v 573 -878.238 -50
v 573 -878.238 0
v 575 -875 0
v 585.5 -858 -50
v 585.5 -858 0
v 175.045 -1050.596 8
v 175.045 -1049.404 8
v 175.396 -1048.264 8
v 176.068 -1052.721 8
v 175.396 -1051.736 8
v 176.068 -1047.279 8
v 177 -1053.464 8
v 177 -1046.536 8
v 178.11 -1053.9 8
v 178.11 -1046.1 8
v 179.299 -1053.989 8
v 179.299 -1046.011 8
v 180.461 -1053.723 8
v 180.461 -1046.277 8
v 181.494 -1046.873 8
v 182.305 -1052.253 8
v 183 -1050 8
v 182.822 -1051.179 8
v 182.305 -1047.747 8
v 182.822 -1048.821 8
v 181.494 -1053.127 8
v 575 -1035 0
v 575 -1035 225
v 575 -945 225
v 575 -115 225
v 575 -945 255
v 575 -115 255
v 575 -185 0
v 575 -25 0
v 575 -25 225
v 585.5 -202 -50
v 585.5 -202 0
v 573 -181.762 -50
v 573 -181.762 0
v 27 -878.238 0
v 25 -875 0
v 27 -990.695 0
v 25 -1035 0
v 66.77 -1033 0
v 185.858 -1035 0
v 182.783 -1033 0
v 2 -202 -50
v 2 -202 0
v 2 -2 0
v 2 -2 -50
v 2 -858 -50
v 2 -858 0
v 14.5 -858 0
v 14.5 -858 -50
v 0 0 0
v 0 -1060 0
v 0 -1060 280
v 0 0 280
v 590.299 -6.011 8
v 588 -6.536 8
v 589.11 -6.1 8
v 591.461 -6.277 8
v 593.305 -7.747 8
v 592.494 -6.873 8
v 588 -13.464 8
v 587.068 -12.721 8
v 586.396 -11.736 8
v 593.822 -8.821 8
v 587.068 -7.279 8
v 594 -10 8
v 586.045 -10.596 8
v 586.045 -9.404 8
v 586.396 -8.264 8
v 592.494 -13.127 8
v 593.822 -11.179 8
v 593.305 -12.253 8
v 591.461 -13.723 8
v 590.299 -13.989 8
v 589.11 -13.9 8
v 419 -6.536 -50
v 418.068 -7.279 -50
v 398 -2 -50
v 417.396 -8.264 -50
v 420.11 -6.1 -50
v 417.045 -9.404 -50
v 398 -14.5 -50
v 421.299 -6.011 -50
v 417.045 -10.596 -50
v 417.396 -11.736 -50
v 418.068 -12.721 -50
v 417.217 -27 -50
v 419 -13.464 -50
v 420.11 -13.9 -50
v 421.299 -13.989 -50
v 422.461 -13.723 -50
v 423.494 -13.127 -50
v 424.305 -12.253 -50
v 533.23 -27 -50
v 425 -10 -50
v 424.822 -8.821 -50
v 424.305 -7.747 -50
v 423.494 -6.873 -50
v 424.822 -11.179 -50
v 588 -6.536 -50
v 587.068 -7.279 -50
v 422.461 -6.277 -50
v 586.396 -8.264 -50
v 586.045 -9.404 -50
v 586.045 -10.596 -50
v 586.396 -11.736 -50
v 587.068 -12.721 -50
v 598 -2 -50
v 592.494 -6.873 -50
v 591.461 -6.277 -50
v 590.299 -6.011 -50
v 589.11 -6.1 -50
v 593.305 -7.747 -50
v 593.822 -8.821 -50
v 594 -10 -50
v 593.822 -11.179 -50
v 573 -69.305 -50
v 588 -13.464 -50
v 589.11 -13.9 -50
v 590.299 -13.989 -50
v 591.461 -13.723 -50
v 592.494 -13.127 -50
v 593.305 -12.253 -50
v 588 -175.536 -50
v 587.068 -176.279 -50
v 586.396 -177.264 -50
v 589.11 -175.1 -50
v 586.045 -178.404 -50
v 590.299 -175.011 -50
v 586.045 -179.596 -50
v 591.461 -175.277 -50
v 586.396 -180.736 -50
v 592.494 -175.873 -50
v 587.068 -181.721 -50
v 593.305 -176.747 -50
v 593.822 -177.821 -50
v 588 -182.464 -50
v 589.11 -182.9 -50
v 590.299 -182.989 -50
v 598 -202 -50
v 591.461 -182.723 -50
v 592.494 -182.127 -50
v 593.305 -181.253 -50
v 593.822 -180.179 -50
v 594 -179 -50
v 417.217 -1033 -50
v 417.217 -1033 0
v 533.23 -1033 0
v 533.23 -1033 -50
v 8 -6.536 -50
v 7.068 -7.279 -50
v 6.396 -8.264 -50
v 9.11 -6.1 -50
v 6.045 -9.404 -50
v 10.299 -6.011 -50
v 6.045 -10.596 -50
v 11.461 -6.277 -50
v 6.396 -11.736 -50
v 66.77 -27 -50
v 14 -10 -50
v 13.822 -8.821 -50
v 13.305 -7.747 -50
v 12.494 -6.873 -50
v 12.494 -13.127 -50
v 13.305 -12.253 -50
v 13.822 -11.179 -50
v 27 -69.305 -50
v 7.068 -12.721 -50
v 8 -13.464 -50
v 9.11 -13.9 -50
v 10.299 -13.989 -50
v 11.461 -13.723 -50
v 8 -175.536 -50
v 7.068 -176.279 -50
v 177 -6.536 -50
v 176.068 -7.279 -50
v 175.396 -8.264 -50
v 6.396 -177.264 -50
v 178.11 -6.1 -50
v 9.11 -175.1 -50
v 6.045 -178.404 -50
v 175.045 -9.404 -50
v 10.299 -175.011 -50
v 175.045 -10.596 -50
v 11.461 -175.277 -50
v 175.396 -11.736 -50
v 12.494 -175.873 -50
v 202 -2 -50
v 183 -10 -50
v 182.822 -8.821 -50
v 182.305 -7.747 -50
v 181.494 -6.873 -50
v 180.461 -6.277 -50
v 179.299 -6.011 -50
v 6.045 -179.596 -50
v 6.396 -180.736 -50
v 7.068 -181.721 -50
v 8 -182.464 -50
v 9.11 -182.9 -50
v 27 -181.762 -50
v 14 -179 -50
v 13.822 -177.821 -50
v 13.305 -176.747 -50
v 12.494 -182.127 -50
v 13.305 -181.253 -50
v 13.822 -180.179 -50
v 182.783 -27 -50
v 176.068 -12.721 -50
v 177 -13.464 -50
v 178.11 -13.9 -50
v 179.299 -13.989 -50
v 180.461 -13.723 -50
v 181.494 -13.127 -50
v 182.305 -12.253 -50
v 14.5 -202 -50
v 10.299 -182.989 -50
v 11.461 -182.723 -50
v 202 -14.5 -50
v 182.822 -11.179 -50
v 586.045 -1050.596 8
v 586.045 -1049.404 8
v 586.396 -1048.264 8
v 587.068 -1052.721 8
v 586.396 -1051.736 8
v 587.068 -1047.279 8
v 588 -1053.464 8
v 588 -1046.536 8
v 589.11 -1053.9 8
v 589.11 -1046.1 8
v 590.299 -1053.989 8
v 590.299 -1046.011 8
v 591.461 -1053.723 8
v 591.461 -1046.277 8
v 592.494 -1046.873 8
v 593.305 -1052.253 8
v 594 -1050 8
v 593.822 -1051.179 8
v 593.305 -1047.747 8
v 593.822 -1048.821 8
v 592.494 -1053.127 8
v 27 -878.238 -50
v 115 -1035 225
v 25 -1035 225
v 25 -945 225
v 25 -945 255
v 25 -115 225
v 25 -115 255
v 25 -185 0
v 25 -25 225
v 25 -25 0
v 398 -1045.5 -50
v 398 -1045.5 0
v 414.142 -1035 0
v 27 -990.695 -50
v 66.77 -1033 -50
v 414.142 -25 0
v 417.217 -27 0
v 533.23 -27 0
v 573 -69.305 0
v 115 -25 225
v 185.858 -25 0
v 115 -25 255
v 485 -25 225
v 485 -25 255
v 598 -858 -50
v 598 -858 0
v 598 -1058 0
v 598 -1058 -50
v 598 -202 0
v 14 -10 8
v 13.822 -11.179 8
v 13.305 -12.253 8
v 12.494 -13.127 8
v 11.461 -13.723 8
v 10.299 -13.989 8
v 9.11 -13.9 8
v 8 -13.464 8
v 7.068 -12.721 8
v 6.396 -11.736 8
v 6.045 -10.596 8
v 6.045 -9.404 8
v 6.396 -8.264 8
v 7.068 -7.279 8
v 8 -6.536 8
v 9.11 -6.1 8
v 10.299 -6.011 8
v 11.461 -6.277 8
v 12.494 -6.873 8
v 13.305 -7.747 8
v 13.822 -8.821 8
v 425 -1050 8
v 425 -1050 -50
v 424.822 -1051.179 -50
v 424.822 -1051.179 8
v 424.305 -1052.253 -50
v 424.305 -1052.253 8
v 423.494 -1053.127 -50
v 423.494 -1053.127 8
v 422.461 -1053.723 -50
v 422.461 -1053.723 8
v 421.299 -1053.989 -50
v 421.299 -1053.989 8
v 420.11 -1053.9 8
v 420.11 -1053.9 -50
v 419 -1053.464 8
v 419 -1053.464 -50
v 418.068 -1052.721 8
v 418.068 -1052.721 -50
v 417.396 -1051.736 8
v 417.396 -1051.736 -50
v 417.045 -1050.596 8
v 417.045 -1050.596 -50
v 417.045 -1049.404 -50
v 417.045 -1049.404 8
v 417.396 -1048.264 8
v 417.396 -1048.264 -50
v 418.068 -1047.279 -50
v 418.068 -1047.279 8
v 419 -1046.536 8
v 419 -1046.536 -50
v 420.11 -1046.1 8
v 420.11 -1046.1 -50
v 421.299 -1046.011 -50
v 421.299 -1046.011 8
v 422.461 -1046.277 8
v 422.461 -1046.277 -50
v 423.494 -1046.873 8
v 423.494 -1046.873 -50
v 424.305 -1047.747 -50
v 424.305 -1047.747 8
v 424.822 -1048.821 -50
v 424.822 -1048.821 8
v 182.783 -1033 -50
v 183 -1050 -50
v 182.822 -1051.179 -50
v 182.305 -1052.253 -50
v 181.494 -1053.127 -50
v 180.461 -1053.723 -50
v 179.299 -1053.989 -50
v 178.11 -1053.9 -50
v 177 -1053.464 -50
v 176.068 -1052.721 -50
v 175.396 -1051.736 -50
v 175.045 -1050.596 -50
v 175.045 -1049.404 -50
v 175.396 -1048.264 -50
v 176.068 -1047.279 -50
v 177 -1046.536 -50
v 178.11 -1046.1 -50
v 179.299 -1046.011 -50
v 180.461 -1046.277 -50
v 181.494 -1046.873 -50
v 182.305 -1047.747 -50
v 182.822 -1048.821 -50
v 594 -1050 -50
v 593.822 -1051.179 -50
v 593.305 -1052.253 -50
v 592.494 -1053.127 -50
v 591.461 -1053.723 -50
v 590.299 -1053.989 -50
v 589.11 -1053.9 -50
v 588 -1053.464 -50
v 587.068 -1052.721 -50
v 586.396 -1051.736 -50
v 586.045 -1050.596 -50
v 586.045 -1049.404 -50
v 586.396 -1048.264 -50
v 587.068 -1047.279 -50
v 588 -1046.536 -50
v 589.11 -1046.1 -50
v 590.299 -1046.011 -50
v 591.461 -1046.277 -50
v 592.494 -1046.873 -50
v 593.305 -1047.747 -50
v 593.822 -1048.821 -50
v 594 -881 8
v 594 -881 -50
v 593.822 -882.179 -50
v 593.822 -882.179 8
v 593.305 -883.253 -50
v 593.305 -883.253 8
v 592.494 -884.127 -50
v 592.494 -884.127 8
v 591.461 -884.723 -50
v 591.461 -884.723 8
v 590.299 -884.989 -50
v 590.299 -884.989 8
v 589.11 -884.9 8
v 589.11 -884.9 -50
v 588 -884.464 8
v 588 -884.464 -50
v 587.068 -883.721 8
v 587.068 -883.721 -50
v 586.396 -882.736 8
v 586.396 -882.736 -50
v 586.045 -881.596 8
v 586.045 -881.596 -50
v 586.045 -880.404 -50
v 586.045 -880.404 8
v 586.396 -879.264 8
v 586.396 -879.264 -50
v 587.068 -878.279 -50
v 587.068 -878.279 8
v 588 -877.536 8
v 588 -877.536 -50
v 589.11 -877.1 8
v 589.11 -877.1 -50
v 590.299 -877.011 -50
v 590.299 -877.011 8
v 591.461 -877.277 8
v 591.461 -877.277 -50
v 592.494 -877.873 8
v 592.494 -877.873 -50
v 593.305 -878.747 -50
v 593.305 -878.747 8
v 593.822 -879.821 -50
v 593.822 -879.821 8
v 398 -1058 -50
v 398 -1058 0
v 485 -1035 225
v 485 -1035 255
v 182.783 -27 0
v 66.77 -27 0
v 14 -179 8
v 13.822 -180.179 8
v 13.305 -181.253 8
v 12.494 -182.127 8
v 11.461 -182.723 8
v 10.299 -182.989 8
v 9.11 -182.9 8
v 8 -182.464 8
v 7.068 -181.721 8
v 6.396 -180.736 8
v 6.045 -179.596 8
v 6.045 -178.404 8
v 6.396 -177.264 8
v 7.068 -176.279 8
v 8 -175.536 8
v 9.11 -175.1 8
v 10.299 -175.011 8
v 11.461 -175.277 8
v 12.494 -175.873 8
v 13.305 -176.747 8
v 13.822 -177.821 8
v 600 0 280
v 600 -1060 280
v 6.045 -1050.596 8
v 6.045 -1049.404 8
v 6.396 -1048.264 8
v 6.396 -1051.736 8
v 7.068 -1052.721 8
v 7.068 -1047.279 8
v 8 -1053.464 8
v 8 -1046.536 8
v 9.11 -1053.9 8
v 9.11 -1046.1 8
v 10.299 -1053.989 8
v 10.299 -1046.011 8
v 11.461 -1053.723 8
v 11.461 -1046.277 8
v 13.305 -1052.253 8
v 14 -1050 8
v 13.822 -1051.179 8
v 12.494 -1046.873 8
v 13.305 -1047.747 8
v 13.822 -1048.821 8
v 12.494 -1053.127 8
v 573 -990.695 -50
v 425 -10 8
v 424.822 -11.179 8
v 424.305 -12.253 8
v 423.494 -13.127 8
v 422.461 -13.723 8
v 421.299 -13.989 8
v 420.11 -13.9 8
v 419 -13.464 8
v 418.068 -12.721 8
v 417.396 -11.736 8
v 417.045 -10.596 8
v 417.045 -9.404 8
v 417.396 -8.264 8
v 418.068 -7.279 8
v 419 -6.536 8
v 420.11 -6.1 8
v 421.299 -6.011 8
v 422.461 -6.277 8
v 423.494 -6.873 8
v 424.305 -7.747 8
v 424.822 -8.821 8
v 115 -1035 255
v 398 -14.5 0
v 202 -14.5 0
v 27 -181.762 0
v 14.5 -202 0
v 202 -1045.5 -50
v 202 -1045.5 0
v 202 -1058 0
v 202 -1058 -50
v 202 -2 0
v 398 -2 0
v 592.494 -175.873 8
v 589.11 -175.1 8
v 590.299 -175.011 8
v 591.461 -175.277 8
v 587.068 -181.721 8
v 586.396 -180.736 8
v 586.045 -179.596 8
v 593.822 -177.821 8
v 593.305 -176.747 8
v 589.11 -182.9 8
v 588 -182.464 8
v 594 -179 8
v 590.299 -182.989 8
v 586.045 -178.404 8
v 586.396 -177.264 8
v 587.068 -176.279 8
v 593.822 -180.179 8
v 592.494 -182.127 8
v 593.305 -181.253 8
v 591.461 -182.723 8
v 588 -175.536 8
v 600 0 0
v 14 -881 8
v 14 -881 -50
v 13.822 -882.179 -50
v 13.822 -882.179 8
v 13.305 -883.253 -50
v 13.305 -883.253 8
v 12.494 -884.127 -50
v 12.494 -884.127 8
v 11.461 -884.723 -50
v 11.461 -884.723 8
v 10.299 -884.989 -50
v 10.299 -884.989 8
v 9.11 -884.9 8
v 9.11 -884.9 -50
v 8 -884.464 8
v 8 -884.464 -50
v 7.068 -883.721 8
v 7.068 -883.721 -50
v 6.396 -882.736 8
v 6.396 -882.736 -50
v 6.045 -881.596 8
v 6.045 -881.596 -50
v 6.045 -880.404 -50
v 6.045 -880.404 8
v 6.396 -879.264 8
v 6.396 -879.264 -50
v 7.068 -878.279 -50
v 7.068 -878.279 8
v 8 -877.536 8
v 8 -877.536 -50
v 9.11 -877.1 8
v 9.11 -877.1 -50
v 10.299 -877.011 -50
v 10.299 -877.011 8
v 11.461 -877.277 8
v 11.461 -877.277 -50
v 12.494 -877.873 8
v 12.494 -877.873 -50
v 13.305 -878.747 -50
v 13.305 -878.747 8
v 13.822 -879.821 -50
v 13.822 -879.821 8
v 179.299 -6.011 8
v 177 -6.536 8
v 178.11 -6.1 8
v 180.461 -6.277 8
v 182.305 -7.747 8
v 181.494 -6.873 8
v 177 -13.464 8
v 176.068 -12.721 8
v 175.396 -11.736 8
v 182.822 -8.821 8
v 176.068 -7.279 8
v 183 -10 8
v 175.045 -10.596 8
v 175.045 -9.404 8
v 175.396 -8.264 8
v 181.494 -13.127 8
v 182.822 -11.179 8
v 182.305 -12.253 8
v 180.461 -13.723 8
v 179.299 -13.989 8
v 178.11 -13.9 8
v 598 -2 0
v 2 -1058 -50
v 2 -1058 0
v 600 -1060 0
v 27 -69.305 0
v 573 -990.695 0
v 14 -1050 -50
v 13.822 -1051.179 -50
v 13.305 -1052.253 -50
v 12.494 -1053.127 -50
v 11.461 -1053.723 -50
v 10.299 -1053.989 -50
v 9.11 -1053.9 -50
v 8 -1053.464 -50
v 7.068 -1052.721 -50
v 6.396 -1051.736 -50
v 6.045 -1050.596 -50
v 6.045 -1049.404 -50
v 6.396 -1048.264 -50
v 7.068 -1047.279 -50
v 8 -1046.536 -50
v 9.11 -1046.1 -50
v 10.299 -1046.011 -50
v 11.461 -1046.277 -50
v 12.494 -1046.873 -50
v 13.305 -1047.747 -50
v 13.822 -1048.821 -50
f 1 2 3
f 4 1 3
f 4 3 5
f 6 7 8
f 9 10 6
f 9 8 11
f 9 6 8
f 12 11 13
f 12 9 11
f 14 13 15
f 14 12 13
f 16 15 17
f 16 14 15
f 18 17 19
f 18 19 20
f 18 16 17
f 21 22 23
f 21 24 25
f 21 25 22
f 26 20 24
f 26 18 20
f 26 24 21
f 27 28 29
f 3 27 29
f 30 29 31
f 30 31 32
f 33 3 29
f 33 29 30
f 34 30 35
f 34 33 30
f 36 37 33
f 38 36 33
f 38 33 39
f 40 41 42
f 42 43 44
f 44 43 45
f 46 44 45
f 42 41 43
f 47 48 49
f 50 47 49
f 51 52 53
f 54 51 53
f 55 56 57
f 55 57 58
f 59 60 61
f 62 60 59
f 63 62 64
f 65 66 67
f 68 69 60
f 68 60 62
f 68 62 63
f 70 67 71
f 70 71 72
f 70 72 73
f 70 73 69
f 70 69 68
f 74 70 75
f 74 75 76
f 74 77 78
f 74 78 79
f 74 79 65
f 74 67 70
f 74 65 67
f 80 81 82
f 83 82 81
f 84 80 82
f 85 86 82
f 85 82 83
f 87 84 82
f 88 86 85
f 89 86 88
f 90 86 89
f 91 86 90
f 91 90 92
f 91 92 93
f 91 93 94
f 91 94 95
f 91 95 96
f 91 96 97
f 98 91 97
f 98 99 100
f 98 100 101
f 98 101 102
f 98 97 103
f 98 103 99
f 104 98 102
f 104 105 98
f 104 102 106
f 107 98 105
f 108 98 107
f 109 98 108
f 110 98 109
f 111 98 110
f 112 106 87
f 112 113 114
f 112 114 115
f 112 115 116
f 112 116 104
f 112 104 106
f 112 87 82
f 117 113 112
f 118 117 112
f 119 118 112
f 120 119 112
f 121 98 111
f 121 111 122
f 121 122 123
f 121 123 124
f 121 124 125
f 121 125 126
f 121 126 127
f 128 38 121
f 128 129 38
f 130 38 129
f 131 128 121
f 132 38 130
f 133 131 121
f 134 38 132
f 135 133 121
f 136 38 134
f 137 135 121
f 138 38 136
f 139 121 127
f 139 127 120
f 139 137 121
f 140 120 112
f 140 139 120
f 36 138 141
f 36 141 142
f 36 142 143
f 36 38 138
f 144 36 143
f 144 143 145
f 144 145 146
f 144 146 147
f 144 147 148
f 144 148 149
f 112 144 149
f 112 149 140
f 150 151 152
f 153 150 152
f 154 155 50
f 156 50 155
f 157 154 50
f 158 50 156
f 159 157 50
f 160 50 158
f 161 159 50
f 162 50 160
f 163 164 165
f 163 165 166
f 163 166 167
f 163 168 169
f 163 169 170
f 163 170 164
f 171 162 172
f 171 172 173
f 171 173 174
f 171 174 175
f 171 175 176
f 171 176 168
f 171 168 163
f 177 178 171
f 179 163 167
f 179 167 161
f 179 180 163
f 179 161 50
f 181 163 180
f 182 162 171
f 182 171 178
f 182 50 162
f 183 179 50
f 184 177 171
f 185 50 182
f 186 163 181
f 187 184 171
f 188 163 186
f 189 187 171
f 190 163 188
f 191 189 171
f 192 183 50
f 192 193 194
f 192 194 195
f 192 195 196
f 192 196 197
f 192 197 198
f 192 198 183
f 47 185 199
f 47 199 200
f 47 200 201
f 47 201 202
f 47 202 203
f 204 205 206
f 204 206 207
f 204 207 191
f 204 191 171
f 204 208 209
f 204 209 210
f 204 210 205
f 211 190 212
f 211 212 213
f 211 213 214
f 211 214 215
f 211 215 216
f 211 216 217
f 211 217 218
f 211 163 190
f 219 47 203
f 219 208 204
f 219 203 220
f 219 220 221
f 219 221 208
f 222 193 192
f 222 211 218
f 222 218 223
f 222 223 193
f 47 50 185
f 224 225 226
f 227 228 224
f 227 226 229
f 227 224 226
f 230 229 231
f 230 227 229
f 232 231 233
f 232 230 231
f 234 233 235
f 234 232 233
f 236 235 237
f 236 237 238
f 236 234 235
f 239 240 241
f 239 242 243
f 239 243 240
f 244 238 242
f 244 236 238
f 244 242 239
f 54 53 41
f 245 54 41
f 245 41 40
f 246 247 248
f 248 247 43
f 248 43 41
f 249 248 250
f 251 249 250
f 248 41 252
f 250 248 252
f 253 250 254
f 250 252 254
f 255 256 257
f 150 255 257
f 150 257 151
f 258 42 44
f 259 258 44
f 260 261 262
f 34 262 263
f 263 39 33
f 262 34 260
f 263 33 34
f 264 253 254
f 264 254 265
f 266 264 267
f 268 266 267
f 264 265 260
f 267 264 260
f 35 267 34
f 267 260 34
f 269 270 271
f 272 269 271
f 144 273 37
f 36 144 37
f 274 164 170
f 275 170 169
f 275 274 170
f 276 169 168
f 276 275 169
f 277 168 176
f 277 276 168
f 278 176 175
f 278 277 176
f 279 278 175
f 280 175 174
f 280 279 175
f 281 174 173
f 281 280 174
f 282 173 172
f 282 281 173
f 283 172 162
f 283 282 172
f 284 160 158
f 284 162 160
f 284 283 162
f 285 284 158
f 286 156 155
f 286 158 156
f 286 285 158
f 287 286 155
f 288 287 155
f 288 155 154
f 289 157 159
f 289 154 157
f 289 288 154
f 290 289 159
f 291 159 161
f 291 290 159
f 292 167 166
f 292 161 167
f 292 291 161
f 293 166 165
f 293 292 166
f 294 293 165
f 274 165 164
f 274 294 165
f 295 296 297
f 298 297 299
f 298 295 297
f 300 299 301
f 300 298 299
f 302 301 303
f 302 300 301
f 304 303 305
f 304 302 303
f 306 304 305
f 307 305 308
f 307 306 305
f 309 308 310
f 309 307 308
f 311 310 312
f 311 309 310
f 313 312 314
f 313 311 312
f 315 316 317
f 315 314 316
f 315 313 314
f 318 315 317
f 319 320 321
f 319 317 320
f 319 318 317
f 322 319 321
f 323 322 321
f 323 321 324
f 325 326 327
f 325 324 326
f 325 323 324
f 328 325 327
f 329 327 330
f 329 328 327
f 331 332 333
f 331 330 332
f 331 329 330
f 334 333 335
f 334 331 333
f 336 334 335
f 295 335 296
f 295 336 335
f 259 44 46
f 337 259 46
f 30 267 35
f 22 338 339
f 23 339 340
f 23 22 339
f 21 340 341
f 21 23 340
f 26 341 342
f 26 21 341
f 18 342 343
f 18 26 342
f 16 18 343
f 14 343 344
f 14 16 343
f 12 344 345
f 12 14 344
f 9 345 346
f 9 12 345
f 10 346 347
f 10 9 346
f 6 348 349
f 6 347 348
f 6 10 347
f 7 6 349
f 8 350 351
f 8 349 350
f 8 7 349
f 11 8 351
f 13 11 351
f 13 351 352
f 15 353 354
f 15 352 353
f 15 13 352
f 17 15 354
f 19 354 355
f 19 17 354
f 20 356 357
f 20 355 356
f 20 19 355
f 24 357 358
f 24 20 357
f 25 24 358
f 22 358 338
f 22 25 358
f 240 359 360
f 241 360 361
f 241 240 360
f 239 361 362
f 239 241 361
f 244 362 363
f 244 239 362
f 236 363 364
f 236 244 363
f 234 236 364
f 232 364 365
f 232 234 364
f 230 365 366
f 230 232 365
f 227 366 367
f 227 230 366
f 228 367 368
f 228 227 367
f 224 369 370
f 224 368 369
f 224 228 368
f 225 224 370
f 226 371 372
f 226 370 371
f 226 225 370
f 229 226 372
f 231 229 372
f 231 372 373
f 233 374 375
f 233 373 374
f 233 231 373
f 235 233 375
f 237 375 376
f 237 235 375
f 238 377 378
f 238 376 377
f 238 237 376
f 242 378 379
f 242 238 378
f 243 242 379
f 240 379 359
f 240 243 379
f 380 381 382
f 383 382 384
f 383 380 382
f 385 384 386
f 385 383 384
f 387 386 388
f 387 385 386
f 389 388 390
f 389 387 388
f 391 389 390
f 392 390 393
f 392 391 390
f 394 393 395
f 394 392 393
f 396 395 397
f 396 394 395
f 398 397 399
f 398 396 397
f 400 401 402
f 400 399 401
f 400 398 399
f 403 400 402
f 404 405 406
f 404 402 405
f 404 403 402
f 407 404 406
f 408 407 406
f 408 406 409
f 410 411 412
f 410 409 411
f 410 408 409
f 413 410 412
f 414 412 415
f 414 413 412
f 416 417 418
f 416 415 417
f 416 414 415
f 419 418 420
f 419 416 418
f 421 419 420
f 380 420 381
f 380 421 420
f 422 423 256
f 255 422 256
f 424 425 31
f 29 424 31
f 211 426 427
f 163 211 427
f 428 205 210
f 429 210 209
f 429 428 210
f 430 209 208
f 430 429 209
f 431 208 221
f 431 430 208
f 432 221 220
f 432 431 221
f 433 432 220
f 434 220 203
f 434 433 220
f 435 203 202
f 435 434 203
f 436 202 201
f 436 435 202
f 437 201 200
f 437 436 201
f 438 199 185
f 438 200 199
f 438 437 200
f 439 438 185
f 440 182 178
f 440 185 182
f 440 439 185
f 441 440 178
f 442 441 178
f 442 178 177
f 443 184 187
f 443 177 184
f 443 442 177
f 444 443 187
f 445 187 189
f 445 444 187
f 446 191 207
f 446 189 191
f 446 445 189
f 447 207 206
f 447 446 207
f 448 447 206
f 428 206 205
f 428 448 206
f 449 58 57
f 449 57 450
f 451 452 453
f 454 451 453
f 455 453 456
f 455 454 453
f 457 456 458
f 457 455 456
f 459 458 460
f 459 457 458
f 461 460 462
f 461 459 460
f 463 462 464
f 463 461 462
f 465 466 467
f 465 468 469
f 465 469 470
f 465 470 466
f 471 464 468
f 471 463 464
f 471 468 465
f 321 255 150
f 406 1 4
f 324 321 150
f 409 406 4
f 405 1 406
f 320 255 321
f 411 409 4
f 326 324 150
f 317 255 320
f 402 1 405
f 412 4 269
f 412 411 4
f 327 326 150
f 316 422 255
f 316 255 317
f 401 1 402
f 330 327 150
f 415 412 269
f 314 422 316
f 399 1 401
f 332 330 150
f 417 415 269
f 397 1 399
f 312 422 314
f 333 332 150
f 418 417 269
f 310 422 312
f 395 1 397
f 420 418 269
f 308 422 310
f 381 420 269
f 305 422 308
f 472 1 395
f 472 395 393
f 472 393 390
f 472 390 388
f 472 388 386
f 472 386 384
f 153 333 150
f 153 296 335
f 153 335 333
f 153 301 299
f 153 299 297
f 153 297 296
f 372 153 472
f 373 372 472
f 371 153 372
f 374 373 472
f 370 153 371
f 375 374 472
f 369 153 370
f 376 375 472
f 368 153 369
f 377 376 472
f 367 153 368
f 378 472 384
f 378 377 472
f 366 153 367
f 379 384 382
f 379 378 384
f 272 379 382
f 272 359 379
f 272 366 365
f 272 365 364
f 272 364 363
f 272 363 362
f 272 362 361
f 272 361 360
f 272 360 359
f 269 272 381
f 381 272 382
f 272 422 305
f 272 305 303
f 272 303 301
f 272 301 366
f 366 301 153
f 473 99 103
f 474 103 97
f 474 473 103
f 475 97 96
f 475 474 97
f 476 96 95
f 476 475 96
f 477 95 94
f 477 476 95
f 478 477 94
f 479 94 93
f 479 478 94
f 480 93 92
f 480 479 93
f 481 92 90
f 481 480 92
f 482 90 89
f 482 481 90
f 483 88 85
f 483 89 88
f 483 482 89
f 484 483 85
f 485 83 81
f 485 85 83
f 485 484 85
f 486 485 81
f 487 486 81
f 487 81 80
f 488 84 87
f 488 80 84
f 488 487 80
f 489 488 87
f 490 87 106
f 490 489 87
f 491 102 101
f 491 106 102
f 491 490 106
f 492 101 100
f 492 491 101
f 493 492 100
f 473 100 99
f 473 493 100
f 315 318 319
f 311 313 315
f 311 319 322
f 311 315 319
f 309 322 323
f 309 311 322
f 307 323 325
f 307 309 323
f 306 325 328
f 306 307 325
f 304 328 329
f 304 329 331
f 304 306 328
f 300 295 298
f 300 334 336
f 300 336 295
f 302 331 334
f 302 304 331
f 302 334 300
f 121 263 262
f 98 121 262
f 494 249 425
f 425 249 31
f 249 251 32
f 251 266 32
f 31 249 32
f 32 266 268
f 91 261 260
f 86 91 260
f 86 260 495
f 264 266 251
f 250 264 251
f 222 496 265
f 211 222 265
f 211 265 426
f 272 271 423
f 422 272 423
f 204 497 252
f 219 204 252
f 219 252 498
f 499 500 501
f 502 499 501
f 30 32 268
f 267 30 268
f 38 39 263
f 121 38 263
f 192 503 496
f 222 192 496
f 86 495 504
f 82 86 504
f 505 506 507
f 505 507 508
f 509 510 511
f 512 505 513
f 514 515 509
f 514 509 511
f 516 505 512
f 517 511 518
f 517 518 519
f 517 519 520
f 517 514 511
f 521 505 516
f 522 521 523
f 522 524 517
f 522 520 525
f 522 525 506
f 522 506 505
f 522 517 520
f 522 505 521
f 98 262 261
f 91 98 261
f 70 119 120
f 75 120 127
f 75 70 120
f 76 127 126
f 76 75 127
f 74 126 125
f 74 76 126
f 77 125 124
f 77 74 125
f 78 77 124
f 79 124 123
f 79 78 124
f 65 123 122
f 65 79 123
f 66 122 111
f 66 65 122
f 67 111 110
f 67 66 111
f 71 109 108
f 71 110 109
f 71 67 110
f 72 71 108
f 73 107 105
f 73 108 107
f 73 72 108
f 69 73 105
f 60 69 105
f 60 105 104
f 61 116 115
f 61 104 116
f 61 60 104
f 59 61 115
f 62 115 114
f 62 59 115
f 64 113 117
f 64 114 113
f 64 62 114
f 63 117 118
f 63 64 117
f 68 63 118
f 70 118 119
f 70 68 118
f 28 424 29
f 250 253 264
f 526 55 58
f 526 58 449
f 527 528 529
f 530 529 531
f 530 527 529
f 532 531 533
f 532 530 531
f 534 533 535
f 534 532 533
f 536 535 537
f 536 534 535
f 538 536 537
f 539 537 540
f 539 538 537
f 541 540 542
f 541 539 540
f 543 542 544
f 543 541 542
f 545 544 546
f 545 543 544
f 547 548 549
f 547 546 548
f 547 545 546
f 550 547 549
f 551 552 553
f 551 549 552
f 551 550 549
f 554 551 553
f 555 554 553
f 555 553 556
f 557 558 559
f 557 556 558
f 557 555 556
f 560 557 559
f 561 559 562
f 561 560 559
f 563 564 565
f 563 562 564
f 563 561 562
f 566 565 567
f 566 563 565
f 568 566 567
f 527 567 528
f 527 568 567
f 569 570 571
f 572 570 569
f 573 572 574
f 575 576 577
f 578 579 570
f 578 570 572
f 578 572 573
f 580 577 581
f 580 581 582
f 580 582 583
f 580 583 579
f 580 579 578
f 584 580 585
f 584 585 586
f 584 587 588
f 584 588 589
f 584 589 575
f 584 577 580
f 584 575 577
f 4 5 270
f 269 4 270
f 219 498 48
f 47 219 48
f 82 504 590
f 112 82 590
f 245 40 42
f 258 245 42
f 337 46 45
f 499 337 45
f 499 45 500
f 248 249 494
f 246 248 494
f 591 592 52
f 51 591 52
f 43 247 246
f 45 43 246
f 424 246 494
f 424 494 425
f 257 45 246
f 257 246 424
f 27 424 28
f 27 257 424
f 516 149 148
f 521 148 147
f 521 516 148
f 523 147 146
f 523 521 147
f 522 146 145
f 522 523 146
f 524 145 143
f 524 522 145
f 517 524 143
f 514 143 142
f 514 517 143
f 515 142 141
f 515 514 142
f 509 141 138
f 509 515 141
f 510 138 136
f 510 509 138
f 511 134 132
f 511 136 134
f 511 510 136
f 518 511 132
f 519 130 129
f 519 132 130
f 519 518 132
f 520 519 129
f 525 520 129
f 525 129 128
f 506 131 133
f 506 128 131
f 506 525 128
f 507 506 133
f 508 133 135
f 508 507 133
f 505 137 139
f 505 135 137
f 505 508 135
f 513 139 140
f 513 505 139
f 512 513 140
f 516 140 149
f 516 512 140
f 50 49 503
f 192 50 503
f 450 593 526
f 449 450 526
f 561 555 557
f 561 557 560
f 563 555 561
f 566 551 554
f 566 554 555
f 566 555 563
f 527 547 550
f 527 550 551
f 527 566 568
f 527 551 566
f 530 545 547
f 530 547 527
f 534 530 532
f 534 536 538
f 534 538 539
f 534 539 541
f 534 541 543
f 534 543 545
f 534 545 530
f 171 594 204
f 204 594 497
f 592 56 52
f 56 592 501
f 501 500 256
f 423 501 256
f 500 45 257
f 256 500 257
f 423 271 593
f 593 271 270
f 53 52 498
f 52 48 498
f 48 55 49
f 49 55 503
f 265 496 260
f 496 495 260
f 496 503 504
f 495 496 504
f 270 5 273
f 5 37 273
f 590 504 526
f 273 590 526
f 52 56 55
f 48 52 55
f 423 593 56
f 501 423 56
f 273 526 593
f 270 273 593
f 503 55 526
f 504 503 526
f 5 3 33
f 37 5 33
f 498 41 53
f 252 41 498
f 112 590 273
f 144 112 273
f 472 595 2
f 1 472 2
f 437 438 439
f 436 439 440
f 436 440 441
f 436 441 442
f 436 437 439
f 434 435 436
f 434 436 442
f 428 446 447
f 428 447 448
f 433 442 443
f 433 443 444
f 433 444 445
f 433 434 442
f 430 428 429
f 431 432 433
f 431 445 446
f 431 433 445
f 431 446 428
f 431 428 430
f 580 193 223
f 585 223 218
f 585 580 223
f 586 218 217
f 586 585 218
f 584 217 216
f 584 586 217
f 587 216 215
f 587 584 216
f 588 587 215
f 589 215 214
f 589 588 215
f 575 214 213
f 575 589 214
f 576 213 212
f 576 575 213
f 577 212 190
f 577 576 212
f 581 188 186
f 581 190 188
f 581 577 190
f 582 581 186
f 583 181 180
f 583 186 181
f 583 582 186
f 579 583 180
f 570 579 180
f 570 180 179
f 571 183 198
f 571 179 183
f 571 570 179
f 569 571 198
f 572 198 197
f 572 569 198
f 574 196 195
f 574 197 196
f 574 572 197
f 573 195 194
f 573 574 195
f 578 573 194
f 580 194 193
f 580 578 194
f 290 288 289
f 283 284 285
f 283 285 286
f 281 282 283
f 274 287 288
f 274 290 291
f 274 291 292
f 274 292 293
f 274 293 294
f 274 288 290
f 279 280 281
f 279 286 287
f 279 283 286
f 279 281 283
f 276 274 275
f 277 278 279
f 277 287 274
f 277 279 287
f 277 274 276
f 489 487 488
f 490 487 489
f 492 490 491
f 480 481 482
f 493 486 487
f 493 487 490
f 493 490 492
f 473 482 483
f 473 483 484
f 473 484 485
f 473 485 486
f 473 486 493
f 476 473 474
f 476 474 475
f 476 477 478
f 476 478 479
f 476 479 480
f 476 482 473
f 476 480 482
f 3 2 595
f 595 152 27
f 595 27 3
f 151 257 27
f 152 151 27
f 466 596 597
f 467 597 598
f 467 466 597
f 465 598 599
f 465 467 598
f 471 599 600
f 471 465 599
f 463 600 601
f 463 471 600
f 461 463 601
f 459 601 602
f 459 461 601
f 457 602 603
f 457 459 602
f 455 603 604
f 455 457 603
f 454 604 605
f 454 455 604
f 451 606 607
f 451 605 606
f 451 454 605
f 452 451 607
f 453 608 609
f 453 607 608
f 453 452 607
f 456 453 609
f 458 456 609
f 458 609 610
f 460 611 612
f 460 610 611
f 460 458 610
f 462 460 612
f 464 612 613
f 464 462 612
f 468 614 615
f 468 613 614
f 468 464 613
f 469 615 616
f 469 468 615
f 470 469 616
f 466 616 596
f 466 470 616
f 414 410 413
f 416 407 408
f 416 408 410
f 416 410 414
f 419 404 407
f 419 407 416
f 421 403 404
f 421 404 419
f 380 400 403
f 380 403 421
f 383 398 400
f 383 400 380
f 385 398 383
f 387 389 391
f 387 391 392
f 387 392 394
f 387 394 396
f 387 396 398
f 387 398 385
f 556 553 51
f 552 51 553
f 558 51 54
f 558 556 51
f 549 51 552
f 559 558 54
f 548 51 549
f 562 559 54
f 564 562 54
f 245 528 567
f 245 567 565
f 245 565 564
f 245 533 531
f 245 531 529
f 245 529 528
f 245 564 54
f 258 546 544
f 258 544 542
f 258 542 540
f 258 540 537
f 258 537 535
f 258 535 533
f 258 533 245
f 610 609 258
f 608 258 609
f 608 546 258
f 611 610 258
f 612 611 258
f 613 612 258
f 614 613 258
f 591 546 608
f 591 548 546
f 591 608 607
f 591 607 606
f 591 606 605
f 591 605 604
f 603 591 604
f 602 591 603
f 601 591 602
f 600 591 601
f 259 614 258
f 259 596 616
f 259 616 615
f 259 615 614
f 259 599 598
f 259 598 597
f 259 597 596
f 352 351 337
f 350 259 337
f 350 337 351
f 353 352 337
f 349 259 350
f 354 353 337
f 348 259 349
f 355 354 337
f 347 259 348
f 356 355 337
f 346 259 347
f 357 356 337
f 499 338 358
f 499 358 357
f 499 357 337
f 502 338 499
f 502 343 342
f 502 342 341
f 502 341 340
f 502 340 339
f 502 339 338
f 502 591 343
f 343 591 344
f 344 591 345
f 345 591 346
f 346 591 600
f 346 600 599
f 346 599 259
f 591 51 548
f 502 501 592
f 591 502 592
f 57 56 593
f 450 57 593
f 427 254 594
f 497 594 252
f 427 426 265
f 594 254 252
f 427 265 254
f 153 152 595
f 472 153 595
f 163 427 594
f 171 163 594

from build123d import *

# Parameters (mm, degrees)
F0_W      = 600
F0_H      = 1060
F1_DEPTH  = 280
F2_T      = -25
F3_R      = 4
F4_DEPTH  = 8
F6_DEPTH  = 30
F9_DEPTH  = 50
F10_DEPTH = 50
F11_DEPTH = 50.001


with BuildPart() as f1:
    # F0 (on Top) → F1 (new body)
    with BuildSketch(Plane.XY):
        with Locations((300, -530)):
            Rectangle(F0_W, F0_H)
    extrude(amount=F1_DEPTH)

    # F2
    f2_openings = [f1.faces().sort_by_distance(p)[0] for p in [
        (300, -530, 0),
    ]]
    offset(amount=F2_T, openings=f2_openings)

    # F3 (on face) → F4 (cut)
    with BuildSketch(Plane(origin=(0, 0, 0), x_dir=(1, 0, 0), z_dir=(0, 0, -1))):
        with Locations((10, 1050)):
            Circle(F3_R)
        with Locations((10, 881)):
            Circle(F3_R)
        with Locations((179, 1050)):
            Circle(F3_R)
        with Locations((590, 1050)):
            Circle(F3_R)
        with Locations((421, 1050)):
            Circle(F3_R)
        with Locations((590, 881)):
            Circle(F3_R)
        with Locations((10, 179)):
            Circle(F3_R)
        with Locations((10, 10)):
            Circle(F3_R)
        with Locations((179, 10)):
            Circle(F3_R)
        with Locations((421, 10)):
            Circle(F3_R)
        with Locations((590, 10)):
            Circle(F3_R)
        with Locations((590, 179)):
            Circle(F3_R)
    extrude(amount=-F4_DEPTH, mode=Mode.SUBTRACT)

    # F5 (on face) → F6 (join)
    with BuildSketch(Plane(origin=(0, 0, 255), x_dir=(1, 0, 0), z_dir=(0, 0, -1))):
        Polygon((115, 1035), (25, 1035), (25, 945), align=None)
        Polygon((485, 1035), (575, 945), (575, 1035), align=None)
        Polygon((115, 25), (25, 115), (25, 25), align=None)
        Polygon((575, 25), (575, 115), (485, 25), align=None)
    extrude(amount=F6_DEPTH)

    # F8 (on face) → F9 (join)
    with BuildSketch(Plane(origin=(0, 0, 0), x_dir=(1, 0, 0), z_dir=(0, 0, -1))):
        Polygon((202, 1058), (2, 1058), (2, 1018.136144), (2, 858), (14.5, 858), (27, 878.238261), (27, 990.695417), (66.770039, 1033), (182.782859, 1033), (202, 1045.5), align=None)
        Polygon((533.229961, 1033), (573, 990.695417), (573, 878.238261), (585.5, 858), (598, 858), (598, 1058), (398, 1058), (398, 1045.5), (417.217141, 1033), align=None)
        Polygon((14.5, 202), (2, 202), (2, 2), (202, 2), (202, 14.5), (182.782859, 27), (66.770039, 27), (27, 69.304583), (27, 181.761739), align=None)
        Polygon((533.229961, 27), (417.217141, 27), (398, 14.5), (398, 2), (598, 2), (598, 202), (585.5, 202), (573, 181.761739), (573, 69.304583), align=None)
    extrude(amount=F9_DEPTH)

    # F8 (on face) → F10 (join)
    with BuildSketch(Plane(origin=(0, 0, 0), x_dir=(1, 0, 0), z_dir=(0, 0, -1))):
        Polygon((202, 1058), (2, 1058), (2, 1018.136144), (2, 858), (14.5, 858), (27, 878.238261), (27, 990.695417), (66.770039, 1033), (182.782859, 1033), (202, 1045.5), align=None)
        Polygon((533.229961, 1033), (573, 990.695417), (573, 878.238261), (585.5, 858), (598, 858), (598, 1058), (398, 1058), (398, 1045.5), (417.217141, 1033), align=None)
        Polygon((14.5, 202), (2, 202), (2, 2), (202, 2), (202, 14.5), (182.782859, 27), (66.770039, 27), (27, 69.304583), (27, 181.761739), align=None)
        Polygon((533.229961, 27), (417.217141, 27), (398, 14.5), (398, 2), (598, 2), (598, 202), (585.5, 202), (573, 181.761739), (573, 69.304583), align=None)
    extrude(amount=F10_DEPTH)

    # F3 (on face) → F11 (cut, through all)
    with BuildSketch(Plane(origin=(0, 0, 0), x_dir=(1, 0, 0), z_dir=(0, 0, -1))):
        with Locations((10, 1050)):
            Circle(F3_R)
        with Locations((10, 881)):
            Circle(F3_R)
        with Locations((179, 1050)):
            Circle(F3_R)
        with Locations((590, 1050)):
            Circle(F3_R)
        with Locations((421, 1050)):
            Circle(F3_R)
        with Locations((590, 881)):
            Circle(F3_R)
        with Locations((10, 179)):
            Circle(F3_R)
        with Locations((10, 10)):
            Circle(F3_R)
        with Locations((179, 10)):
            Circle(F3_R)
        with Locations((421, 10)):
            Circle(F3_R)
        with Locations((590, 10)):
            Circle(F3_R)
        with Locations((590, 179)):
            Circle(F3_R)
    extrude(amount=F11_DEPTH, mode=Mode.SUBTRACT)


solid = f1.part
